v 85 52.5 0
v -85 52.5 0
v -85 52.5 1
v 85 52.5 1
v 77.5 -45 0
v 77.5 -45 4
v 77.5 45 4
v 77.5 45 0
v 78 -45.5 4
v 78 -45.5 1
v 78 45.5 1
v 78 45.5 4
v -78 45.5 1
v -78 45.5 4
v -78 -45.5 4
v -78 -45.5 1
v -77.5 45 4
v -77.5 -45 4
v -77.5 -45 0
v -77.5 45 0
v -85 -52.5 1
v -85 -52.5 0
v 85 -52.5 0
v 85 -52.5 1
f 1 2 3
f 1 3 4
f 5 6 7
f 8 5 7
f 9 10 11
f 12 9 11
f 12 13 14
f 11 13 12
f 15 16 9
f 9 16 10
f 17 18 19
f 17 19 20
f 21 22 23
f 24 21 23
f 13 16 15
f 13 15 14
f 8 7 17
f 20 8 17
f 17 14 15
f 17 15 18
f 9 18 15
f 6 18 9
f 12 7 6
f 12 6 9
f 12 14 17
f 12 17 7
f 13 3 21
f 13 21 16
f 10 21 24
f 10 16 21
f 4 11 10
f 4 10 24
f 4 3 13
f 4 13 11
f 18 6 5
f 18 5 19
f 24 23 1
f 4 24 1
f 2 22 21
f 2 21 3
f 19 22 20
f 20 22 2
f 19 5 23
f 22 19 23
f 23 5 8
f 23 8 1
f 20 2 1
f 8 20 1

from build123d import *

# Parameters (mm, degrees)
SKETCH_W        = 170
SKETCH_H        = 105
PAD_DEPTH       = 1
SKETCH001_W     = 156
SKETCH001_H     = 91
SKETCH001_W_2   = 155
SKETCH001_H_2   = 90
PAD001_DEPTH    = 3
PAD001_FACE16_W = 90
PAD001_FACE16_H = 155
POCKET_DEPTH    = 5


with BuildPart() as part:
    # Sketch → Pad (new body)
    with BuildSketch(Plane.XY):
        Rectangle(SKETCH_W, SKETCH_H)
    extrude(amount=PAD_DEPTH)

    # Sketch001 (on Face6 of Pad) → Pad001 (join)
    with BuildSketch(Plane.XY.offset(1)):
        Rectangle(SKETCH001_W, SKETCH001_H)
        Rectangle(SKETCH001_W_2, SKETCH001_H_2, mode=Mode.SUBTRACT)
    extrude(amount=PAD001_DEPTH)

    # Pad001 Face16 → Pocket (cut)
    with BuildSketch(Plane(origin=(0, 0, 1), x_dir=(0, 1, 0), z_dir=(0, 0, 1))):
        Rectangle(PAD001_FACE16_W, PAD001_FACE16_H)
    extrude(amount=-POCKET_DEPTH, mode=Mode.SUBTRACT)


solid = part.part
